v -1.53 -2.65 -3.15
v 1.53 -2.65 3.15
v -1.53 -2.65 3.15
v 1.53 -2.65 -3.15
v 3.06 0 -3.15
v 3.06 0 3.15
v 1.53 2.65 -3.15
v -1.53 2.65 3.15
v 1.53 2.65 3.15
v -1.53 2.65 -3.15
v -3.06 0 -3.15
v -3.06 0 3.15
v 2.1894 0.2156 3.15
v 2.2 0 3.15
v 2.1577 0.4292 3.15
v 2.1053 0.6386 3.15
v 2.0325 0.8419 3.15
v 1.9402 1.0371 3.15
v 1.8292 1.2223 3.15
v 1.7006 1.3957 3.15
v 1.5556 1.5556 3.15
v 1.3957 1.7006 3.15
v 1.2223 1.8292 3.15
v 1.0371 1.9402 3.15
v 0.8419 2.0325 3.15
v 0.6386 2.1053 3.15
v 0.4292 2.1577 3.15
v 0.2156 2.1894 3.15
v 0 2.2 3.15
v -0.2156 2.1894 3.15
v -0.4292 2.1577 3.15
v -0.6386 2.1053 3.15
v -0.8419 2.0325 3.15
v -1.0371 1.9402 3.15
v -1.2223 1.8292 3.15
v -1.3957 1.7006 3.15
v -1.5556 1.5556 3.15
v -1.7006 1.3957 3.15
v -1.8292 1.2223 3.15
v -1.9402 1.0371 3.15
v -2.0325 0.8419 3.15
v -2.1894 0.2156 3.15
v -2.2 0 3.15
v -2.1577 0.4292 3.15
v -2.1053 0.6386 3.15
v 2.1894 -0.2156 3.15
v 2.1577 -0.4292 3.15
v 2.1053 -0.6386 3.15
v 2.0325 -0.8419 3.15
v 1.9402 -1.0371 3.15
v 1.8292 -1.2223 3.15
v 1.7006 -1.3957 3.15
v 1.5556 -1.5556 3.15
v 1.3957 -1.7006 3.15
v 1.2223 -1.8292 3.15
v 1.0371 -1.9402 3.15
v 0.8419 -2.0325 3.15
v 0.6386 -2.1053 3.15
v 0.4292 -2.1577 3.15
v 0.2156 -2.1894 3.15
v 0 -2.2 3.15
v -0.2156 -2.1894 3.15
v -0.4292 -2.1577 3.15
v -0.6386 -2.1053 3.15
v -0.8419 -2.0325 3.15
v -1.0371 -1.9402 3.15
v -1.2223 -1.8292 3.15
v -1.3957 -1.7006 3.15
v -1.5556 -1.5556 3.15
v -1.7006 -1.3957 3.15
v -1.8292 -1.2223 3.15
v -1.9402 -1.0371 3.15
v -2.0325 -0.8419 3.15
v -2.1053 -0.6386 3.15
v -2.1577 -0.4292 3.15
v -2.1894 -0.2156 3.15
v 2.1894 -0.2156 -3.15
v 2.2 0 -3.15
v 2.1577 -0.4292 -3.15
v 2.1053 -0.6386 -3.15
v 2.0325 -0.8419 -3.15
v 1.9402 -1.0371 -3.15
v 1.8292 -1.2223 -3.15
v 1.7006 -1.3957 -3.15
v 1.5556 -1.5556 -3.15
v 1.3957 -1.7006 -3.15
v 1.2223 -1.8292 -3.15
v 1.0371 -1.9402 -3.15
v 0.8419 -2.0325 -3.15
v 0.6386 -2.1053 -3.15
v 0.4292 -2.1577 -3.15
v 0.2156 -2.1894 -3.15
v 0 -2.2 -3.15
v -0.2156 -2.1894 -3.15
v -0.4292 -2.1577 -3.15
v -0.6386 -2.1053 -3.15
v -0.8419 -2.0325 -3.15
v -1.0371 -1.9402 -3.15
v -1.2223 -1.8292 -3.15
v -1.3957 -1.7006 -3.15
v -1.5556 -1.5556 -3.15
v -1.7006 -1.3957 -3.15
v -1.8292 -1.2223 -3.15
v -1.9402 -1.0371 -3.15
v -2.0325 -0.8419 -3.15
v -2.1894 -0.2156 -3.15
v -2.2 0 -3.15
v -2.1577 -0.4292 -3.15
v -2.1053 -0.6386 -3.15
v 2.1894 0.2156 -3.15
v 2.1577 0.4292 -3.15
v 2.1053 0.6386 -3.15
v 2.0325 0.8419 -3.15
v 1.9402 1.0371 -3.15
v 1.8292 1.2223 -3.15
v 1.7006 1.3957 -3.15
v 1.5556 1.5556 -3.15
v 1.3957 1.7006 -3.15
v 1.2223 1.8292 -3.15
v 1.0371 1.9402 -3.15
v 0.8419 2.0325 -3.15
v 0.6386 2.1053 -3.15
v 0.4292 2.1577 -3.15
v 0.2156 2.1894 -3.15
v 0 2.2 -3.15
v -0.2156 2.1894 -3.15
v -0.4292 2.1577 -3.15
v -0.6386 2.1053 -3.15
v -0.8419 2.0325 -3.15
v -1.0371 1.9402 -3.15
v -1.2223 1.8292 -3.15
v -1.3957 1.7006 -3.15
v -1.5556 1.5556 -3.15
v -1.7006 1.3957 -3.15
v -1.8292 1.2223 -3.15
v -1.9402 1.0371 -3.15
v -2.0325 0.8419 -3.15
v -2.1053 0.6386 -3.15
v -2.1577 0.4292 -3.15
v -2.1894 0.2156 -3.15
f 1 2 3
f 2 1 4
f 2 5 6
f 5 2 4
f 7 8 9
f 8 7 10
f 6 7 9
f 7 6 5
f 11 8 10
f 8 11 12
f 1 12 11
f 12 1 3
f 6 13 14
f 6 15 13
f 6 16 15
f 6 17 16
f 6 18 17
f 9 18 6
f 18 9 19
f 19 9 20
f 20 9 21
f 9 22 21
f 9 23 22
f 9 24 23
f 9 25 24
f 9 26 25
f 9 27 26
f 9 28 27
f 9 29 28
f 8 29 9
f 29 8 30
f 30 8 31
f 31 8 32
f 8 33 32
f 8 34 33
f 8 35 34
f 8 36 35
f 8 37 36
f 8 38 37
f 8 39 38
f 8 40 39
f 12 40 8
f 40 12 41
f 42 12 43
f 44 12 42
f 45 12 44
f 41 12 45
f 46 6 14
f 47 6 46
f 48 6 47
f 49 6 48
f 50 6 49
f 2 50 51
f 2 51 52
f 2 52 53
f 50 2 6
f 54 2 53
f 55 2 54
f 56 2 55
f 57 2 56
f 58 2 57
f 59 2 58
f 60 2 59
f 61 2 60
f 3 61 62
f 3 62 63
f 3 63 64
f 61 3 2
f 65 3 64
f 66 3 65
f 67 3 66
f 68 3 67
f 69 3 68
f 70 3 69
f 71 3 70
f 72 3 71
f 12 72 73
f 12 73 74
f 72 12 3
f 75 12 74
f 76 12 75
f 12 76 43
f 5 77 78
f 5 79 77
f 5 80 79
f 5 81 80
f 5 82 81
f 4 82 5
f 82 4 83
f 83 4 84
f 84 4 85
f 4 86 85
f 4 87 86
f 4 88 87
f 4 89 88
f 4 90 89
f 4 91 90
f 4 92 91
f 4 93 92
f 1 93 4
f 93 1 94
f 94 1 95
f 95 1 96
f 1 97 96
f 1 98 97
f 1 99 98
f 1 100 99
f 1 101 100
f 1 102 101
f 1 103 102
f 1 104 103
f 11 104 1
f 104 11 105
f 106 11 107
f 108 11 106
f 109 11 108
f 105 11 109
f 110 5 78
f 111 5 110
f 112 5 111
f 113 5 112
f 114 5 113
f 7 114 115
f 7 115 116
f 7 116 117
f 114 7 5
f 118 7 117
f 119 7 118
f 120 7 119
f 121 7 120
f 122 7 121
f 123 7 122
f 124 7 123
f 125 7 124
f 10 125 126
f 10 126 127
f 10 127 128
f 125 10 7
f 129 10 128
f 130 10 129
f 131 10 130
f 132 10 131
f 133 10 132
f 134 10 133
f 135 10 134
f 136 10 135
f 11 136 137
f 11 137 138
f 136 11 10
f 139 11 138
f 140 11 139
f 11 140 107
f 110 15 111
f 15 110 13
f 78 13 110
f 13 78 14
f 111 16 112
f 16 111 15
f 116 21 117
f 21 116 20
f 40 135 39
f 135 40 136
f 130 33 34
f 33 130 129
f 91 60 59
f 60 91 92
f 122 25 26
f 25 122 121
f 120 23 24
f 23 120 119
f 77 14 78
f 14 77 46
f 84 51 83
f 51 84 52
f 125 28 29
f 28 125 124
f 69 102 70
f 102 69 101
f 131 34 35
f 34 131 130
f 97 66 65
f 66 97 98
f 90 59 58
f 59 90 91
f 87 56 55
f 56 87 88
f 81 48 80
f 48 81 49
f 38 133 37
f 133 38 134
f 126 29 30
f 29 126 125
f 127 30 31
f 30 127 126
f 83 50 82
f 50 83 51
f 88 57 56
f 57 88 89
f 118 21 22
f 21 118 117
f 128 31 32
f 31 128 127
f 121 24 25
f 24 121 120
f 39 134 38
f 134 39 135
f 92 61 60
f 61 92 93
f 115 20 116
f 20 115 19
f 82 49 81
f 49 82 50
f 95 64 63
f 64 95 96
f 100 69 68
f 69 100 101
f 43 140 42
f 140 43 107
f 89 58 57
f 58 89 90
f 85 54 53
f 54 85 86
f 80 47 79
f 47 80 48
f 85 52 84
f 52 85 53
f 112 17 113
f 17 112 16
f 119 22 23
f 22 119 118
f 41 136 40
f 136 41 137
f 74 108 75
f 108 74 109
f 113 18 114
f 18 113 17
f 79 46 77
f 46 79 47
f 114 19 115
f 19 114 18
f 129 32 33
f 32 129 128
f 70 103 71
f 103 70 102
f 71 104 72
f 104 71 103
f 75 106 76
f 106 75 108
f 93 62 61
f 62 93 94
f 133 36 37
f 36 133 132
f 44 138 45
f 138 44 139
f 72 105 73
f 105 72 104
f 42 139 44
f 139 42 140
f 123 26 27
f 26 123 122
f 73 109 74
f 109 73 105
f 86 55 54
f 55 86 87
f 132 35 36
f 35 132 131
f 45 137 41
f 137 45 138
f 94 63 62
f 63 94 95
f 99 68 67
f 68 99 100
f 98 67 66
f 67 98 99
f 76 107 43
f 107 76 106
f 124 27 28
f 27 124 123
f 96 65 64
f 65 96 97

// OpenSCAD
// Hex nut for 4.0mm screw
// Specs: 5.3mm across flats, 6.3mm thick
// Note: This is a plain clearance hole (no modeled threads).

thread_diameter_mm = 4.0;      // screw nominal diameter
across_flats_mm    = 5.3;      // hex across flats
thickness_mm       = 6.3;      // nut thickness
hole_clearance_mm  = 0.4;      // clearance for screw
eps_mm             = 0.2;      // boolean safety

module hex_nut() {
    hex_R = across_flats_mm / (2 * cos(30));                 // circumradius for $fn=6
    hole_r = (thread_diameter_mm + hole_clearance_mm) / 2;

    difference() {
        cylinder(r=hex_R, h=thickness_mm, center=true, $fn=6);
        cylinder(r=hole_r, h=thickness_mm + 2*eps_mm, center=true, $fn=64);
    }
}

hex_nut();
